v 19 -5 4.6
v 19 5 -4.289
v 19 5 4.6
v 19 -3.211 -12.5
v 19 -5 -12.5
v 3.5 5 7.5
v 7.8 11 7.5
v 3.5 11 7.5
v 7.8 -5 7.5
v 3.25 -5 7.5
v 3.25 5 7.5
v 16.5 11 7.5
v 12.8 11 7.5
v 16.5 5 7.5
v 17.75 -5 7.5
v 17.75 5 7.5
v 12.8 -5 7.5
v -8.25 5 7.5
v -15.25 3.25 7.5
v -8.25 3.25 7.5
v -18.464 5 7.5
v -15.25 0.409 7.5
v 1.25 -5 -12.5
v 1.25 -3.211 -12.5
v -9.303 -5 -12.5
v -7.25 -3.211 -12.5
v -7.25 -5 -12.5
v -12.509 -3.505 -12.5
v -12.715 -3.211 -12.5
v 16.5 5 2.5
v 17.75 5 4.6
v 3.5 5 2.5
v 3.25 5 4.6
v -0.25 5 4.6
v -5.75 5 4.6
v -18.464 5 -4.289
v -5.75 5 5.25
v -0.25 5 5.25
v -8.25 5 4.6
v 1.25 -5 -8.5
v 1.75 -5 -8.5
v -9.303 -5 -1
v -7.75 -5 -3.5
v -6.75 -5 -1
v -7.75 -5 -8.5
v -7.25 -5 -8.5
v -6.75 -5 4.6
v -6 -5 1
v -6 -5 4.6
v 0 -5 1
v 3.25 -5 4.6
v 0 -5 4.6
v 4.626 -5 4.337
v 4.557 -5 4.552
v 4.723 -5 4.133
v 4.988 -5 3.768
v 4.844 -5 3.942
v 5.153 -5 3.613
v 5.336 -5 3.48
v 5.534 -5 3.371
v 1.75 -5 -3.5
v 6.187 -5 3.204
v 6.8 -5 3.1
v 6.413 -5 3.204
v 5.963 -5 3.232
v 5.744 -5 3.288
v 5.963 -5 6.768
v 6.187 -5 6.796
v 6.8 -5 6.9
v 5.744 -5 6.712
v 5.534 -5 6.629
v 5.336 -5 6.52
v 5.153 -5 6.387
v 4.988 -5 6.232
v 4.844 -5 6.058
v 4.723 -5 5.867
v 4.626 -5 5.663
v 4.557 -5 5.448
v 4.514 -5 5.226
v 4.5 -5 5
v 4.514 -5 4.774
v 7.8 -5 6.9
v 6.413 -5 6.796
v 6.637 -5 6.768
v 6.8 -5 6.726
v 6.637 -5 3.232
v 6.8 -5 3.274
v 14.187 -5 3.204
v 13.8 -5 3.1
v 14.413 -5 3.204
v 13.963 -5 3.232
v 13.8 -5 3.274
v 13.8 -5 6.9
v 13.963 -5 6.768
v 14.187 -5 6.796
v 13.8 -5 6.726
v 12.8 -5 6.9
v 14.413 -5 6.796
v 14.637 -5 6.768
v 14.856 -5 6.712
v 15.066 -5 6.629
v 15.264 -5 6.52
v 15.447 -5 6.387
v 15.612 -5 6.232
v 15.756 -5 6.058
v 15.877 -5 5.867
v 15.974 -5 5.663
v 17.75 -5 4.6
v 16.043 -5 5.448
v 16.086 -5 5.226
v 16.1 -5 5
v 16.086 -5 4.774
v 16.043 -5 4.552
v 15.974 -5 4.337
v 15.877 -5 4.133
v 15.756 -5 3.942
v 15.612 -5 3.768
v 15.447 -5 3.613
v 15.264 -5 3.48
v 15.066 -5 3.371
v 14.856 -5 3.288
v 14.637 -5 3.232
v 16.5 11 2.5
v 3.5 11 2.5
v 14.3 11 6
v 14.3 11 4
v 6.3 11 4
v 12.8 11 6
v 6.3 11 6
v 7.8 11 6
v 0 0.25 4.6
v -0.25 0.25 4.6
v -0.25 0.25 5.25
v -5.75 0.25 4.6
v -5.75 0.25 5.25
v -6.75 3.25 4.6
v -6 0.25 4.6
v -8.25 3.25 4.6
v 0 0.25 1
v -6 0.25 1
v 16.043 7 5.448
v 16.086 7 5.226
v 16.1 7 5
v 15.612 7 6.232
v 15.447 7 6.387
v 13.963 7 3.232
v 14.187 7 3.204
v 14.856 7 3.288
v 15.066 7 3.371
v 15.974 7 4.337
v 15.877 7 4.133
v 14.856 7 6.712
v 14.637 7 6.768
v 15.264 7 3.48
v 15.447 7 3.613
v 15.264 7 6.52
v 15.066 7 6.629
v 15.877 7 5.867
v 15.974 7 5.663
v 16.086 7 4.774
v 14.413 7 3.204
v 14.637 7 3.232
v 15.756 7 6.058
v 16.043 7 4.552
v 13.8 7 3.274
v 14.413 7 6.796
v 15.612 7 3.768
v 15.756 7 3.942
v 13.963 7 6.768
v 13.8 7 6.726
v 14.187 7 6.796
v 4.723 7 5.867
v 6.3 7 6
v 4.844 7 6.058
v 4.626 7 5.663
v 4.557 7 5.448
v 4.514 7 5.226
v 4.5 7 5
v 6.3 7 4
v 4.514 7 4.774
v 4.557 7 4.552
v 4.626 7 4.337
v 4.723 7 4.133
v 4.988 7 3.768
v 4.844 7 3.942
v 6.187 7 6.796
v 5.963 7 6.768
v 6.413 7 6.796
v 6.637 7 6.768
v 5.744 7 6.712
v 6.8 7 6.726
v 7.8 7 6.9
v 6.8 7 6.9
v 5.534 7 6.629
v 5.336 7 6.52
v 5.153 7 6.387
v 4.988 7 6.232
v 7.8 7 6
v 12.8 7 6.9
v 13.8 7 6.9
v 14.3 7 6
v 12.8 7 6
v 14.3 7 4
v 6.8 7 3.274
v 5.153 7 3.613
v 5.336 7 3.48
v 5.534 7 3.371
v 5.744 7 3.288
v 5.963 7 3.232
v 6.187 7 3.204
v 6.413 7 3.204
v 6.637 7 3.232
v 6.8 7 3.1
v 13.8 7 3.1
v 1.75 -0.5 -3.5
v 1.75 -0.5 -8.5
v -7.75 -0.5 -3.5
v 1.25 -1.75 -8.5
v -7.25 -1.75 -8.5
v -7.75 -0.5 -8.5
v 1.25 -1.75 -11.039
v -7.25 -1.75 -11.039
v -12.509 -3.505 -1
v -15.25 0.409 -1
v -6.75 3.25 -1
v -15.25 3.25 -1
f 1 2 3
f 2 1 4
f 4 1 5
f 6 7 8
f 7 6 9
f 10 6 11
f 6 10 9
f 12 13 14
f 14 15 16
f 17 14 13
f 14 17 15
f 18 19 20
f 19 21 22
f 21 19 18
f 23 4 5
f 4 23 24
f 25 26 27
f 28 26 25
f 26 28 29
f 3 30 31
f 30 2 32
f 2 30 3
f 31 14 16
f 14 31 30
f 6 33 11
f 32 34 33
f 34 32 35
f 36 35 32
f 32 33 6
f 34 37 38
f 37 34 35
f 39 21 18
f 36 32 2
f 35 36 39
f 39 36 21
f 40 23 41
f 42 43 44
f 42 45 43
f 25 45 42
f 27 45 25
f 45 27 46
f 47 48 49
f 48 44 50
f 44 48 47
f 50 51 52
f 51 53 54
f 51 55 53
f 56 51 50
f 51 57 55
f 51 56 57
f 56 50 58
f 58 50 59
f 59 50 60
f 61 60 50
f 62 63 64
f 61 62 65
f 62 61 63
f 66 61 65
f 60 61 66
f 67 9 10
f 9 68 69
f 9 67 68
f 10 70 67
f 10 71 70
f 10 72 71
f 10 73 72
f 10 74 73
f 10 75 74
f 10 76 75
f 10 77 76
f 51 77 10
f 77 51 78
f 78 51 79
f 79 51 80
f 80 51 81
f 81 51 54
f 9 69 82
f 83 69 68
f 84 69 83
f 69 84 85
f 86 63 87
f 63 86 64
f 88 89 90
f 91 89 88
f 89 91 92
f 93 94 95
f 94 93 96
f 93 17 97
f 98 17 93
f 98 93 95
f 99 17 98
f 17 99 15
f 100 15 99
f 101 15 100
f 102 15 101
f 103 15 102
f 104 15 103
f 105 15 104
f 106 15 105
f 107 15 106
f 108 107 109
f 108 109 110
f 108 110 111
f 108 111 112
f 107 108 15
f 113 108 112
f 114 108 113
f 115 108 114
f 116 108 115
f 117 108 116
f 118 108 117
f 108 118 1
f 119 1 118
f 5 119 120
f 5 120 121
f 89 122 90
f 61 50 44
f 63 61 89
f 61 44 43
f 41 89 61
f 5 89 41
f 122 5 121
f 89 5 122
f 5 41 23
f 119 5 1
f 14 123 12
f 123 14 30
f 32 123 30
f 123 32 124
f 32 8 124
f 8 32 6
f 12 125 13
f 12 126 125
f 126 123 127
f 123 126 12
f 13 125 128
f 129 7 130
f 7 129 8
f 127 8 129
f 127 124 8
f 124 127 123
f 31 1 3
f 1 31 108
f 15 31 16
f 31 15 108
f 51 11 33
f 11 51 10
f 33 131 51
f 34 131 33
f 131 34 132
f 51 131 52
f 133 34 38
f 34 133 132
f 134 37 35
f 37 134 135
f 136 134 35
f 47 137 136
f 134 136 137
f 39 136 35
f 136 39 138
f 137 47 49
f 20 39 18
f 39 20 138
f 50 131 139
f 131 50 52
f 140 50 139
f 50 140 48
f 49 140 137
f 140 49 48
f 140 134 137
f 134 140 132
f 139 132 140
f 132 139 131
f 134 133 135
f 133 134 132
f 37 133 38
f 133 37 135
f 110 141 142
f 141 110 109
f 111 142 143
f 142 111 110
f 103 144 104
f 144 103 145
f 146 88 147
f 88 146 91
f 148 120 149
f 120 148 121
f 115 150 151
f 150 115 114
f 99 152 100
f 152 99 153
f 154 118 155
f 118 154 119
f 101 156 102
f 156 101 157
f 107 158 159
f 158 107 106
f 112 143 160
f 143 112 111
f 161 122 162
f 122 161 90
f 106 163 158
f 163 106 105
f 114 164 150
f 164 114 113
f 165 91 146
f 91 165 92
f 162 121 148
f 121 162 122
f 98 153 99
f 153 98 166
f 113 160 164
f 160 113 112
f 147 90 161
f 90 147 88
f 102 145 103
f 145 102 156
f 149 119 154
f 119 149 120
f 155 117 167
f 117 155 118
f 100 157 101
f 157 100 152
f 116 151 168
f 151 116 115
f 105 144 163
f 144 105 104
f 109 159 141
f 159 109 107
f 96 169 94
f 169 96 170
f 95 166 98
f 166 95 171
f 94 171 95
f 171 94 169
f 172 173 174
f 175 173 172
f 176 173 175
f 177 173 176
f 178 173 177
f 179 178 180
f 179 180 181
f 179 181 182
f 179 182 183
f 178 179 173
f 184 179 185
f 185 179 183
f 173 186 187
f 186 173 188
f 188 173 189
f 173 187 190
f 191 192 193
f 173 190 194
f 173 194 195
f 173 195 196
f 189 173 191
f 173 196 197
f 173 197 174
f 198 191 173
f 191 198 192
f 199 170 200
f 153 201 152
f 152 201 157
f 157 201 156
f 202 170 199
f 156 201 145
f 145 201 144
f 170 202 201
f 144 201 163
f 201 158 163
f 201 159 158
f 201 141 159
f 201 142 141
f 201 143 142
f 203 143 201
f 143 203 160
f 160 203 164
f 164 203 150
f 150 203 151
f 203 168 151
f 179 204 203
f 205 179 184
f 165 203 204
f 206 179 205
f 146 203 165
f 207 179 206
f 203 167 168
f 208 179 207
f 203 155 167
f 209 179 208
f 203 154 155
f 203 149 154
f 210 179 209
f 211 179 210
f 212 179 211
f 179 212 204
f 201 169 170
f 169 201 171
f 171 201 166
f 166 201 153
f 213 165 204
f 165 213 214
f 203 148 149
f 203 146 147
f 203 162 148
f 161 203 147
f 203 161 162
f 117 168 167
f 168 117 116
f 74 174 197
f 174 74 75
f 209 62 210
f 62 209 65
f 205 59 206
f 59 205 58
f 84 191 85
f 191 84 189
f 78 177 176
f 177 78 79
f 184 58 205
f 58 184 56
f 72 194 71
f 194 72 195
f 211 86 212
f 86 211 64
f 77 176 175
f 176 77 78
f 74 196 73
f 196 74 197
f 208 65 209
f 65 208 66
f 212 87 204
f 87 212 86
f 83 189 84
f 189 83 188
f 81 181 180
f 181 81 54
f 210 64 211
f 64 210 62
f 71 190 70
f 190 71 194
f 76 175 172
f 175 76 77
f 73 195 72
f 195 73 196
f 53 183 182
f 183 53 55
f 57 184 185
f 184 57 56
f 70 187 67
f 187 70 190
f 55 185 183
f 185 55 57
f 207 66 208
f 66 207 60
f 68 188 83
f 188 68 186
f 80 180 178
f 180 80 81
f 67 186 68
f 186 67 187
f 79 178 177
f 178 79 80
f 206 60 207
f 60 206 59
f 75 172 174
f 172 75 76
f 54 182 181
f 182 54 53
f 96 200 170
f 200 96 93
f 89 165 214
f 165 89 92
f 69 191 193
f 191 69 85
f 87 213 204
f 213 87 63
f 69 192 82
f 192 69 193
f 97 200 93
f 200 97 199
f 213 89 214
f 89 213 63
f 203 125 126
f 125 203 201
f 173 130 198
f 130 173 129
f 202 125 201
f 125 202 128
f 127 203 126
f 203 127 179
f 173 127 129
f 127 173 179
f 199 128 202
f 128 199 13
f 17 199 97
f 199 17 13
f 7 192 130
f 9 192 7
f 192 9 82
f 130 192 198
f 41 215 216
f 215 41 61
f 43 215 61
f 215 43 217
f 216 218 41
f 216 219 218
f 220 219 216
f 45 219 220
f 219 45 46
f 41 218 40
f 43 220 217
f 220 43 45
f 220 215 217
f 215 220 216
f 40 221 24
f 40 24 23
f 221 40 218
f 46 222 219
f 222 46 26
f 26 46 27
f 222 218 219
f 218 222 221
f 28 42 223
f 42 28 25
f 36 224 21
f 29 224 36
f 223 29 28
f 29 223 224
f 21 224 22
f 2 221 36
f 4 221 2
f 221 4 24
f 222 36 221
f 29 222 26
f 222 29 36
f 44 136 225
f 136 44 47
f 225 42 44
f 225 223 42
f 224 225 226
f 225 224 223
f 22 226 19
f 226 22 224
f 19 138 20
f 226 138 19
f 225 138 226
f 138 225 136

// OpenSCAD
$fn = 50;


module connector_holder () {
difference() {
    
  union() {  
  translate([0,0,-2.5])
    cube([38, 10, 20], center=true);

  translate([10, 3, 5]) 
    cube([13, 16, 5], center=true);
  }

translate([-74, -30, 0])
  rotate([0,0,65])
    cube([100, 100, 100], center=true);

translate([-69, -10, 0])
  rotate([0,0,35])
    cube([100, 100, 100], center=true);
  
translate([0, 50, -30])
  rotate([45,0,0])
    cube([100, 100, 100], center=true);

translate([-11, -1, 4])
  cube([8.5, 8.5, 10], center= true);

translate([17, 0, 6.1])
  topcuts();

translate([-3,-2.5,4])
  button();

translate([10.3,0, 5])
    usbc();

translate([-3, -3, -6]) 
  switcher();
    
}
}



connector_holder();




//translate([17, 0, 6.5])
//  topcuts();

//translate([9.5,0, 40])
//    button();

module topcuts() {

  translate([2, 0, 0])
    cube([2.5, 30, 3], center = true);
    
  translate([-15.5, 0, 0])
    cube([3.5, 30, 3, ], center = true);

  translate([-24, 0, 0])
    cube([2.5, 30, 3, ], center = true);
}


module button() {
    
    cube([6.0, 5.5, 6], center=true);
    
    translate([0,3,4])
    cube([5.8, 15.5, 5.5], center=true);
    
}

module usbc() {
    
    rotate([90,0,0])
    union() {
    translate([4.0, 0, 0])
      cylinder(r=1.8, h=14, center=true);

    translate([-4.0, 0, 0])
      cylinder(r=1.8, h=14, center=true);

    cube([7, 3.8, 14], center=true);
    }   
    
    translate([0,10,0])
      cube([8,10,2], center=true);
     
    translate([0,0,3])
      cube([5,40,5], center=true);
    
}


module switcher() {
    
    cube([9.5, 5, 5], center=true);
    
    translate([0, -0.5, -4.4]) 
      cube([8.5, 3.5, 4.5], center=true);
    
}



    
